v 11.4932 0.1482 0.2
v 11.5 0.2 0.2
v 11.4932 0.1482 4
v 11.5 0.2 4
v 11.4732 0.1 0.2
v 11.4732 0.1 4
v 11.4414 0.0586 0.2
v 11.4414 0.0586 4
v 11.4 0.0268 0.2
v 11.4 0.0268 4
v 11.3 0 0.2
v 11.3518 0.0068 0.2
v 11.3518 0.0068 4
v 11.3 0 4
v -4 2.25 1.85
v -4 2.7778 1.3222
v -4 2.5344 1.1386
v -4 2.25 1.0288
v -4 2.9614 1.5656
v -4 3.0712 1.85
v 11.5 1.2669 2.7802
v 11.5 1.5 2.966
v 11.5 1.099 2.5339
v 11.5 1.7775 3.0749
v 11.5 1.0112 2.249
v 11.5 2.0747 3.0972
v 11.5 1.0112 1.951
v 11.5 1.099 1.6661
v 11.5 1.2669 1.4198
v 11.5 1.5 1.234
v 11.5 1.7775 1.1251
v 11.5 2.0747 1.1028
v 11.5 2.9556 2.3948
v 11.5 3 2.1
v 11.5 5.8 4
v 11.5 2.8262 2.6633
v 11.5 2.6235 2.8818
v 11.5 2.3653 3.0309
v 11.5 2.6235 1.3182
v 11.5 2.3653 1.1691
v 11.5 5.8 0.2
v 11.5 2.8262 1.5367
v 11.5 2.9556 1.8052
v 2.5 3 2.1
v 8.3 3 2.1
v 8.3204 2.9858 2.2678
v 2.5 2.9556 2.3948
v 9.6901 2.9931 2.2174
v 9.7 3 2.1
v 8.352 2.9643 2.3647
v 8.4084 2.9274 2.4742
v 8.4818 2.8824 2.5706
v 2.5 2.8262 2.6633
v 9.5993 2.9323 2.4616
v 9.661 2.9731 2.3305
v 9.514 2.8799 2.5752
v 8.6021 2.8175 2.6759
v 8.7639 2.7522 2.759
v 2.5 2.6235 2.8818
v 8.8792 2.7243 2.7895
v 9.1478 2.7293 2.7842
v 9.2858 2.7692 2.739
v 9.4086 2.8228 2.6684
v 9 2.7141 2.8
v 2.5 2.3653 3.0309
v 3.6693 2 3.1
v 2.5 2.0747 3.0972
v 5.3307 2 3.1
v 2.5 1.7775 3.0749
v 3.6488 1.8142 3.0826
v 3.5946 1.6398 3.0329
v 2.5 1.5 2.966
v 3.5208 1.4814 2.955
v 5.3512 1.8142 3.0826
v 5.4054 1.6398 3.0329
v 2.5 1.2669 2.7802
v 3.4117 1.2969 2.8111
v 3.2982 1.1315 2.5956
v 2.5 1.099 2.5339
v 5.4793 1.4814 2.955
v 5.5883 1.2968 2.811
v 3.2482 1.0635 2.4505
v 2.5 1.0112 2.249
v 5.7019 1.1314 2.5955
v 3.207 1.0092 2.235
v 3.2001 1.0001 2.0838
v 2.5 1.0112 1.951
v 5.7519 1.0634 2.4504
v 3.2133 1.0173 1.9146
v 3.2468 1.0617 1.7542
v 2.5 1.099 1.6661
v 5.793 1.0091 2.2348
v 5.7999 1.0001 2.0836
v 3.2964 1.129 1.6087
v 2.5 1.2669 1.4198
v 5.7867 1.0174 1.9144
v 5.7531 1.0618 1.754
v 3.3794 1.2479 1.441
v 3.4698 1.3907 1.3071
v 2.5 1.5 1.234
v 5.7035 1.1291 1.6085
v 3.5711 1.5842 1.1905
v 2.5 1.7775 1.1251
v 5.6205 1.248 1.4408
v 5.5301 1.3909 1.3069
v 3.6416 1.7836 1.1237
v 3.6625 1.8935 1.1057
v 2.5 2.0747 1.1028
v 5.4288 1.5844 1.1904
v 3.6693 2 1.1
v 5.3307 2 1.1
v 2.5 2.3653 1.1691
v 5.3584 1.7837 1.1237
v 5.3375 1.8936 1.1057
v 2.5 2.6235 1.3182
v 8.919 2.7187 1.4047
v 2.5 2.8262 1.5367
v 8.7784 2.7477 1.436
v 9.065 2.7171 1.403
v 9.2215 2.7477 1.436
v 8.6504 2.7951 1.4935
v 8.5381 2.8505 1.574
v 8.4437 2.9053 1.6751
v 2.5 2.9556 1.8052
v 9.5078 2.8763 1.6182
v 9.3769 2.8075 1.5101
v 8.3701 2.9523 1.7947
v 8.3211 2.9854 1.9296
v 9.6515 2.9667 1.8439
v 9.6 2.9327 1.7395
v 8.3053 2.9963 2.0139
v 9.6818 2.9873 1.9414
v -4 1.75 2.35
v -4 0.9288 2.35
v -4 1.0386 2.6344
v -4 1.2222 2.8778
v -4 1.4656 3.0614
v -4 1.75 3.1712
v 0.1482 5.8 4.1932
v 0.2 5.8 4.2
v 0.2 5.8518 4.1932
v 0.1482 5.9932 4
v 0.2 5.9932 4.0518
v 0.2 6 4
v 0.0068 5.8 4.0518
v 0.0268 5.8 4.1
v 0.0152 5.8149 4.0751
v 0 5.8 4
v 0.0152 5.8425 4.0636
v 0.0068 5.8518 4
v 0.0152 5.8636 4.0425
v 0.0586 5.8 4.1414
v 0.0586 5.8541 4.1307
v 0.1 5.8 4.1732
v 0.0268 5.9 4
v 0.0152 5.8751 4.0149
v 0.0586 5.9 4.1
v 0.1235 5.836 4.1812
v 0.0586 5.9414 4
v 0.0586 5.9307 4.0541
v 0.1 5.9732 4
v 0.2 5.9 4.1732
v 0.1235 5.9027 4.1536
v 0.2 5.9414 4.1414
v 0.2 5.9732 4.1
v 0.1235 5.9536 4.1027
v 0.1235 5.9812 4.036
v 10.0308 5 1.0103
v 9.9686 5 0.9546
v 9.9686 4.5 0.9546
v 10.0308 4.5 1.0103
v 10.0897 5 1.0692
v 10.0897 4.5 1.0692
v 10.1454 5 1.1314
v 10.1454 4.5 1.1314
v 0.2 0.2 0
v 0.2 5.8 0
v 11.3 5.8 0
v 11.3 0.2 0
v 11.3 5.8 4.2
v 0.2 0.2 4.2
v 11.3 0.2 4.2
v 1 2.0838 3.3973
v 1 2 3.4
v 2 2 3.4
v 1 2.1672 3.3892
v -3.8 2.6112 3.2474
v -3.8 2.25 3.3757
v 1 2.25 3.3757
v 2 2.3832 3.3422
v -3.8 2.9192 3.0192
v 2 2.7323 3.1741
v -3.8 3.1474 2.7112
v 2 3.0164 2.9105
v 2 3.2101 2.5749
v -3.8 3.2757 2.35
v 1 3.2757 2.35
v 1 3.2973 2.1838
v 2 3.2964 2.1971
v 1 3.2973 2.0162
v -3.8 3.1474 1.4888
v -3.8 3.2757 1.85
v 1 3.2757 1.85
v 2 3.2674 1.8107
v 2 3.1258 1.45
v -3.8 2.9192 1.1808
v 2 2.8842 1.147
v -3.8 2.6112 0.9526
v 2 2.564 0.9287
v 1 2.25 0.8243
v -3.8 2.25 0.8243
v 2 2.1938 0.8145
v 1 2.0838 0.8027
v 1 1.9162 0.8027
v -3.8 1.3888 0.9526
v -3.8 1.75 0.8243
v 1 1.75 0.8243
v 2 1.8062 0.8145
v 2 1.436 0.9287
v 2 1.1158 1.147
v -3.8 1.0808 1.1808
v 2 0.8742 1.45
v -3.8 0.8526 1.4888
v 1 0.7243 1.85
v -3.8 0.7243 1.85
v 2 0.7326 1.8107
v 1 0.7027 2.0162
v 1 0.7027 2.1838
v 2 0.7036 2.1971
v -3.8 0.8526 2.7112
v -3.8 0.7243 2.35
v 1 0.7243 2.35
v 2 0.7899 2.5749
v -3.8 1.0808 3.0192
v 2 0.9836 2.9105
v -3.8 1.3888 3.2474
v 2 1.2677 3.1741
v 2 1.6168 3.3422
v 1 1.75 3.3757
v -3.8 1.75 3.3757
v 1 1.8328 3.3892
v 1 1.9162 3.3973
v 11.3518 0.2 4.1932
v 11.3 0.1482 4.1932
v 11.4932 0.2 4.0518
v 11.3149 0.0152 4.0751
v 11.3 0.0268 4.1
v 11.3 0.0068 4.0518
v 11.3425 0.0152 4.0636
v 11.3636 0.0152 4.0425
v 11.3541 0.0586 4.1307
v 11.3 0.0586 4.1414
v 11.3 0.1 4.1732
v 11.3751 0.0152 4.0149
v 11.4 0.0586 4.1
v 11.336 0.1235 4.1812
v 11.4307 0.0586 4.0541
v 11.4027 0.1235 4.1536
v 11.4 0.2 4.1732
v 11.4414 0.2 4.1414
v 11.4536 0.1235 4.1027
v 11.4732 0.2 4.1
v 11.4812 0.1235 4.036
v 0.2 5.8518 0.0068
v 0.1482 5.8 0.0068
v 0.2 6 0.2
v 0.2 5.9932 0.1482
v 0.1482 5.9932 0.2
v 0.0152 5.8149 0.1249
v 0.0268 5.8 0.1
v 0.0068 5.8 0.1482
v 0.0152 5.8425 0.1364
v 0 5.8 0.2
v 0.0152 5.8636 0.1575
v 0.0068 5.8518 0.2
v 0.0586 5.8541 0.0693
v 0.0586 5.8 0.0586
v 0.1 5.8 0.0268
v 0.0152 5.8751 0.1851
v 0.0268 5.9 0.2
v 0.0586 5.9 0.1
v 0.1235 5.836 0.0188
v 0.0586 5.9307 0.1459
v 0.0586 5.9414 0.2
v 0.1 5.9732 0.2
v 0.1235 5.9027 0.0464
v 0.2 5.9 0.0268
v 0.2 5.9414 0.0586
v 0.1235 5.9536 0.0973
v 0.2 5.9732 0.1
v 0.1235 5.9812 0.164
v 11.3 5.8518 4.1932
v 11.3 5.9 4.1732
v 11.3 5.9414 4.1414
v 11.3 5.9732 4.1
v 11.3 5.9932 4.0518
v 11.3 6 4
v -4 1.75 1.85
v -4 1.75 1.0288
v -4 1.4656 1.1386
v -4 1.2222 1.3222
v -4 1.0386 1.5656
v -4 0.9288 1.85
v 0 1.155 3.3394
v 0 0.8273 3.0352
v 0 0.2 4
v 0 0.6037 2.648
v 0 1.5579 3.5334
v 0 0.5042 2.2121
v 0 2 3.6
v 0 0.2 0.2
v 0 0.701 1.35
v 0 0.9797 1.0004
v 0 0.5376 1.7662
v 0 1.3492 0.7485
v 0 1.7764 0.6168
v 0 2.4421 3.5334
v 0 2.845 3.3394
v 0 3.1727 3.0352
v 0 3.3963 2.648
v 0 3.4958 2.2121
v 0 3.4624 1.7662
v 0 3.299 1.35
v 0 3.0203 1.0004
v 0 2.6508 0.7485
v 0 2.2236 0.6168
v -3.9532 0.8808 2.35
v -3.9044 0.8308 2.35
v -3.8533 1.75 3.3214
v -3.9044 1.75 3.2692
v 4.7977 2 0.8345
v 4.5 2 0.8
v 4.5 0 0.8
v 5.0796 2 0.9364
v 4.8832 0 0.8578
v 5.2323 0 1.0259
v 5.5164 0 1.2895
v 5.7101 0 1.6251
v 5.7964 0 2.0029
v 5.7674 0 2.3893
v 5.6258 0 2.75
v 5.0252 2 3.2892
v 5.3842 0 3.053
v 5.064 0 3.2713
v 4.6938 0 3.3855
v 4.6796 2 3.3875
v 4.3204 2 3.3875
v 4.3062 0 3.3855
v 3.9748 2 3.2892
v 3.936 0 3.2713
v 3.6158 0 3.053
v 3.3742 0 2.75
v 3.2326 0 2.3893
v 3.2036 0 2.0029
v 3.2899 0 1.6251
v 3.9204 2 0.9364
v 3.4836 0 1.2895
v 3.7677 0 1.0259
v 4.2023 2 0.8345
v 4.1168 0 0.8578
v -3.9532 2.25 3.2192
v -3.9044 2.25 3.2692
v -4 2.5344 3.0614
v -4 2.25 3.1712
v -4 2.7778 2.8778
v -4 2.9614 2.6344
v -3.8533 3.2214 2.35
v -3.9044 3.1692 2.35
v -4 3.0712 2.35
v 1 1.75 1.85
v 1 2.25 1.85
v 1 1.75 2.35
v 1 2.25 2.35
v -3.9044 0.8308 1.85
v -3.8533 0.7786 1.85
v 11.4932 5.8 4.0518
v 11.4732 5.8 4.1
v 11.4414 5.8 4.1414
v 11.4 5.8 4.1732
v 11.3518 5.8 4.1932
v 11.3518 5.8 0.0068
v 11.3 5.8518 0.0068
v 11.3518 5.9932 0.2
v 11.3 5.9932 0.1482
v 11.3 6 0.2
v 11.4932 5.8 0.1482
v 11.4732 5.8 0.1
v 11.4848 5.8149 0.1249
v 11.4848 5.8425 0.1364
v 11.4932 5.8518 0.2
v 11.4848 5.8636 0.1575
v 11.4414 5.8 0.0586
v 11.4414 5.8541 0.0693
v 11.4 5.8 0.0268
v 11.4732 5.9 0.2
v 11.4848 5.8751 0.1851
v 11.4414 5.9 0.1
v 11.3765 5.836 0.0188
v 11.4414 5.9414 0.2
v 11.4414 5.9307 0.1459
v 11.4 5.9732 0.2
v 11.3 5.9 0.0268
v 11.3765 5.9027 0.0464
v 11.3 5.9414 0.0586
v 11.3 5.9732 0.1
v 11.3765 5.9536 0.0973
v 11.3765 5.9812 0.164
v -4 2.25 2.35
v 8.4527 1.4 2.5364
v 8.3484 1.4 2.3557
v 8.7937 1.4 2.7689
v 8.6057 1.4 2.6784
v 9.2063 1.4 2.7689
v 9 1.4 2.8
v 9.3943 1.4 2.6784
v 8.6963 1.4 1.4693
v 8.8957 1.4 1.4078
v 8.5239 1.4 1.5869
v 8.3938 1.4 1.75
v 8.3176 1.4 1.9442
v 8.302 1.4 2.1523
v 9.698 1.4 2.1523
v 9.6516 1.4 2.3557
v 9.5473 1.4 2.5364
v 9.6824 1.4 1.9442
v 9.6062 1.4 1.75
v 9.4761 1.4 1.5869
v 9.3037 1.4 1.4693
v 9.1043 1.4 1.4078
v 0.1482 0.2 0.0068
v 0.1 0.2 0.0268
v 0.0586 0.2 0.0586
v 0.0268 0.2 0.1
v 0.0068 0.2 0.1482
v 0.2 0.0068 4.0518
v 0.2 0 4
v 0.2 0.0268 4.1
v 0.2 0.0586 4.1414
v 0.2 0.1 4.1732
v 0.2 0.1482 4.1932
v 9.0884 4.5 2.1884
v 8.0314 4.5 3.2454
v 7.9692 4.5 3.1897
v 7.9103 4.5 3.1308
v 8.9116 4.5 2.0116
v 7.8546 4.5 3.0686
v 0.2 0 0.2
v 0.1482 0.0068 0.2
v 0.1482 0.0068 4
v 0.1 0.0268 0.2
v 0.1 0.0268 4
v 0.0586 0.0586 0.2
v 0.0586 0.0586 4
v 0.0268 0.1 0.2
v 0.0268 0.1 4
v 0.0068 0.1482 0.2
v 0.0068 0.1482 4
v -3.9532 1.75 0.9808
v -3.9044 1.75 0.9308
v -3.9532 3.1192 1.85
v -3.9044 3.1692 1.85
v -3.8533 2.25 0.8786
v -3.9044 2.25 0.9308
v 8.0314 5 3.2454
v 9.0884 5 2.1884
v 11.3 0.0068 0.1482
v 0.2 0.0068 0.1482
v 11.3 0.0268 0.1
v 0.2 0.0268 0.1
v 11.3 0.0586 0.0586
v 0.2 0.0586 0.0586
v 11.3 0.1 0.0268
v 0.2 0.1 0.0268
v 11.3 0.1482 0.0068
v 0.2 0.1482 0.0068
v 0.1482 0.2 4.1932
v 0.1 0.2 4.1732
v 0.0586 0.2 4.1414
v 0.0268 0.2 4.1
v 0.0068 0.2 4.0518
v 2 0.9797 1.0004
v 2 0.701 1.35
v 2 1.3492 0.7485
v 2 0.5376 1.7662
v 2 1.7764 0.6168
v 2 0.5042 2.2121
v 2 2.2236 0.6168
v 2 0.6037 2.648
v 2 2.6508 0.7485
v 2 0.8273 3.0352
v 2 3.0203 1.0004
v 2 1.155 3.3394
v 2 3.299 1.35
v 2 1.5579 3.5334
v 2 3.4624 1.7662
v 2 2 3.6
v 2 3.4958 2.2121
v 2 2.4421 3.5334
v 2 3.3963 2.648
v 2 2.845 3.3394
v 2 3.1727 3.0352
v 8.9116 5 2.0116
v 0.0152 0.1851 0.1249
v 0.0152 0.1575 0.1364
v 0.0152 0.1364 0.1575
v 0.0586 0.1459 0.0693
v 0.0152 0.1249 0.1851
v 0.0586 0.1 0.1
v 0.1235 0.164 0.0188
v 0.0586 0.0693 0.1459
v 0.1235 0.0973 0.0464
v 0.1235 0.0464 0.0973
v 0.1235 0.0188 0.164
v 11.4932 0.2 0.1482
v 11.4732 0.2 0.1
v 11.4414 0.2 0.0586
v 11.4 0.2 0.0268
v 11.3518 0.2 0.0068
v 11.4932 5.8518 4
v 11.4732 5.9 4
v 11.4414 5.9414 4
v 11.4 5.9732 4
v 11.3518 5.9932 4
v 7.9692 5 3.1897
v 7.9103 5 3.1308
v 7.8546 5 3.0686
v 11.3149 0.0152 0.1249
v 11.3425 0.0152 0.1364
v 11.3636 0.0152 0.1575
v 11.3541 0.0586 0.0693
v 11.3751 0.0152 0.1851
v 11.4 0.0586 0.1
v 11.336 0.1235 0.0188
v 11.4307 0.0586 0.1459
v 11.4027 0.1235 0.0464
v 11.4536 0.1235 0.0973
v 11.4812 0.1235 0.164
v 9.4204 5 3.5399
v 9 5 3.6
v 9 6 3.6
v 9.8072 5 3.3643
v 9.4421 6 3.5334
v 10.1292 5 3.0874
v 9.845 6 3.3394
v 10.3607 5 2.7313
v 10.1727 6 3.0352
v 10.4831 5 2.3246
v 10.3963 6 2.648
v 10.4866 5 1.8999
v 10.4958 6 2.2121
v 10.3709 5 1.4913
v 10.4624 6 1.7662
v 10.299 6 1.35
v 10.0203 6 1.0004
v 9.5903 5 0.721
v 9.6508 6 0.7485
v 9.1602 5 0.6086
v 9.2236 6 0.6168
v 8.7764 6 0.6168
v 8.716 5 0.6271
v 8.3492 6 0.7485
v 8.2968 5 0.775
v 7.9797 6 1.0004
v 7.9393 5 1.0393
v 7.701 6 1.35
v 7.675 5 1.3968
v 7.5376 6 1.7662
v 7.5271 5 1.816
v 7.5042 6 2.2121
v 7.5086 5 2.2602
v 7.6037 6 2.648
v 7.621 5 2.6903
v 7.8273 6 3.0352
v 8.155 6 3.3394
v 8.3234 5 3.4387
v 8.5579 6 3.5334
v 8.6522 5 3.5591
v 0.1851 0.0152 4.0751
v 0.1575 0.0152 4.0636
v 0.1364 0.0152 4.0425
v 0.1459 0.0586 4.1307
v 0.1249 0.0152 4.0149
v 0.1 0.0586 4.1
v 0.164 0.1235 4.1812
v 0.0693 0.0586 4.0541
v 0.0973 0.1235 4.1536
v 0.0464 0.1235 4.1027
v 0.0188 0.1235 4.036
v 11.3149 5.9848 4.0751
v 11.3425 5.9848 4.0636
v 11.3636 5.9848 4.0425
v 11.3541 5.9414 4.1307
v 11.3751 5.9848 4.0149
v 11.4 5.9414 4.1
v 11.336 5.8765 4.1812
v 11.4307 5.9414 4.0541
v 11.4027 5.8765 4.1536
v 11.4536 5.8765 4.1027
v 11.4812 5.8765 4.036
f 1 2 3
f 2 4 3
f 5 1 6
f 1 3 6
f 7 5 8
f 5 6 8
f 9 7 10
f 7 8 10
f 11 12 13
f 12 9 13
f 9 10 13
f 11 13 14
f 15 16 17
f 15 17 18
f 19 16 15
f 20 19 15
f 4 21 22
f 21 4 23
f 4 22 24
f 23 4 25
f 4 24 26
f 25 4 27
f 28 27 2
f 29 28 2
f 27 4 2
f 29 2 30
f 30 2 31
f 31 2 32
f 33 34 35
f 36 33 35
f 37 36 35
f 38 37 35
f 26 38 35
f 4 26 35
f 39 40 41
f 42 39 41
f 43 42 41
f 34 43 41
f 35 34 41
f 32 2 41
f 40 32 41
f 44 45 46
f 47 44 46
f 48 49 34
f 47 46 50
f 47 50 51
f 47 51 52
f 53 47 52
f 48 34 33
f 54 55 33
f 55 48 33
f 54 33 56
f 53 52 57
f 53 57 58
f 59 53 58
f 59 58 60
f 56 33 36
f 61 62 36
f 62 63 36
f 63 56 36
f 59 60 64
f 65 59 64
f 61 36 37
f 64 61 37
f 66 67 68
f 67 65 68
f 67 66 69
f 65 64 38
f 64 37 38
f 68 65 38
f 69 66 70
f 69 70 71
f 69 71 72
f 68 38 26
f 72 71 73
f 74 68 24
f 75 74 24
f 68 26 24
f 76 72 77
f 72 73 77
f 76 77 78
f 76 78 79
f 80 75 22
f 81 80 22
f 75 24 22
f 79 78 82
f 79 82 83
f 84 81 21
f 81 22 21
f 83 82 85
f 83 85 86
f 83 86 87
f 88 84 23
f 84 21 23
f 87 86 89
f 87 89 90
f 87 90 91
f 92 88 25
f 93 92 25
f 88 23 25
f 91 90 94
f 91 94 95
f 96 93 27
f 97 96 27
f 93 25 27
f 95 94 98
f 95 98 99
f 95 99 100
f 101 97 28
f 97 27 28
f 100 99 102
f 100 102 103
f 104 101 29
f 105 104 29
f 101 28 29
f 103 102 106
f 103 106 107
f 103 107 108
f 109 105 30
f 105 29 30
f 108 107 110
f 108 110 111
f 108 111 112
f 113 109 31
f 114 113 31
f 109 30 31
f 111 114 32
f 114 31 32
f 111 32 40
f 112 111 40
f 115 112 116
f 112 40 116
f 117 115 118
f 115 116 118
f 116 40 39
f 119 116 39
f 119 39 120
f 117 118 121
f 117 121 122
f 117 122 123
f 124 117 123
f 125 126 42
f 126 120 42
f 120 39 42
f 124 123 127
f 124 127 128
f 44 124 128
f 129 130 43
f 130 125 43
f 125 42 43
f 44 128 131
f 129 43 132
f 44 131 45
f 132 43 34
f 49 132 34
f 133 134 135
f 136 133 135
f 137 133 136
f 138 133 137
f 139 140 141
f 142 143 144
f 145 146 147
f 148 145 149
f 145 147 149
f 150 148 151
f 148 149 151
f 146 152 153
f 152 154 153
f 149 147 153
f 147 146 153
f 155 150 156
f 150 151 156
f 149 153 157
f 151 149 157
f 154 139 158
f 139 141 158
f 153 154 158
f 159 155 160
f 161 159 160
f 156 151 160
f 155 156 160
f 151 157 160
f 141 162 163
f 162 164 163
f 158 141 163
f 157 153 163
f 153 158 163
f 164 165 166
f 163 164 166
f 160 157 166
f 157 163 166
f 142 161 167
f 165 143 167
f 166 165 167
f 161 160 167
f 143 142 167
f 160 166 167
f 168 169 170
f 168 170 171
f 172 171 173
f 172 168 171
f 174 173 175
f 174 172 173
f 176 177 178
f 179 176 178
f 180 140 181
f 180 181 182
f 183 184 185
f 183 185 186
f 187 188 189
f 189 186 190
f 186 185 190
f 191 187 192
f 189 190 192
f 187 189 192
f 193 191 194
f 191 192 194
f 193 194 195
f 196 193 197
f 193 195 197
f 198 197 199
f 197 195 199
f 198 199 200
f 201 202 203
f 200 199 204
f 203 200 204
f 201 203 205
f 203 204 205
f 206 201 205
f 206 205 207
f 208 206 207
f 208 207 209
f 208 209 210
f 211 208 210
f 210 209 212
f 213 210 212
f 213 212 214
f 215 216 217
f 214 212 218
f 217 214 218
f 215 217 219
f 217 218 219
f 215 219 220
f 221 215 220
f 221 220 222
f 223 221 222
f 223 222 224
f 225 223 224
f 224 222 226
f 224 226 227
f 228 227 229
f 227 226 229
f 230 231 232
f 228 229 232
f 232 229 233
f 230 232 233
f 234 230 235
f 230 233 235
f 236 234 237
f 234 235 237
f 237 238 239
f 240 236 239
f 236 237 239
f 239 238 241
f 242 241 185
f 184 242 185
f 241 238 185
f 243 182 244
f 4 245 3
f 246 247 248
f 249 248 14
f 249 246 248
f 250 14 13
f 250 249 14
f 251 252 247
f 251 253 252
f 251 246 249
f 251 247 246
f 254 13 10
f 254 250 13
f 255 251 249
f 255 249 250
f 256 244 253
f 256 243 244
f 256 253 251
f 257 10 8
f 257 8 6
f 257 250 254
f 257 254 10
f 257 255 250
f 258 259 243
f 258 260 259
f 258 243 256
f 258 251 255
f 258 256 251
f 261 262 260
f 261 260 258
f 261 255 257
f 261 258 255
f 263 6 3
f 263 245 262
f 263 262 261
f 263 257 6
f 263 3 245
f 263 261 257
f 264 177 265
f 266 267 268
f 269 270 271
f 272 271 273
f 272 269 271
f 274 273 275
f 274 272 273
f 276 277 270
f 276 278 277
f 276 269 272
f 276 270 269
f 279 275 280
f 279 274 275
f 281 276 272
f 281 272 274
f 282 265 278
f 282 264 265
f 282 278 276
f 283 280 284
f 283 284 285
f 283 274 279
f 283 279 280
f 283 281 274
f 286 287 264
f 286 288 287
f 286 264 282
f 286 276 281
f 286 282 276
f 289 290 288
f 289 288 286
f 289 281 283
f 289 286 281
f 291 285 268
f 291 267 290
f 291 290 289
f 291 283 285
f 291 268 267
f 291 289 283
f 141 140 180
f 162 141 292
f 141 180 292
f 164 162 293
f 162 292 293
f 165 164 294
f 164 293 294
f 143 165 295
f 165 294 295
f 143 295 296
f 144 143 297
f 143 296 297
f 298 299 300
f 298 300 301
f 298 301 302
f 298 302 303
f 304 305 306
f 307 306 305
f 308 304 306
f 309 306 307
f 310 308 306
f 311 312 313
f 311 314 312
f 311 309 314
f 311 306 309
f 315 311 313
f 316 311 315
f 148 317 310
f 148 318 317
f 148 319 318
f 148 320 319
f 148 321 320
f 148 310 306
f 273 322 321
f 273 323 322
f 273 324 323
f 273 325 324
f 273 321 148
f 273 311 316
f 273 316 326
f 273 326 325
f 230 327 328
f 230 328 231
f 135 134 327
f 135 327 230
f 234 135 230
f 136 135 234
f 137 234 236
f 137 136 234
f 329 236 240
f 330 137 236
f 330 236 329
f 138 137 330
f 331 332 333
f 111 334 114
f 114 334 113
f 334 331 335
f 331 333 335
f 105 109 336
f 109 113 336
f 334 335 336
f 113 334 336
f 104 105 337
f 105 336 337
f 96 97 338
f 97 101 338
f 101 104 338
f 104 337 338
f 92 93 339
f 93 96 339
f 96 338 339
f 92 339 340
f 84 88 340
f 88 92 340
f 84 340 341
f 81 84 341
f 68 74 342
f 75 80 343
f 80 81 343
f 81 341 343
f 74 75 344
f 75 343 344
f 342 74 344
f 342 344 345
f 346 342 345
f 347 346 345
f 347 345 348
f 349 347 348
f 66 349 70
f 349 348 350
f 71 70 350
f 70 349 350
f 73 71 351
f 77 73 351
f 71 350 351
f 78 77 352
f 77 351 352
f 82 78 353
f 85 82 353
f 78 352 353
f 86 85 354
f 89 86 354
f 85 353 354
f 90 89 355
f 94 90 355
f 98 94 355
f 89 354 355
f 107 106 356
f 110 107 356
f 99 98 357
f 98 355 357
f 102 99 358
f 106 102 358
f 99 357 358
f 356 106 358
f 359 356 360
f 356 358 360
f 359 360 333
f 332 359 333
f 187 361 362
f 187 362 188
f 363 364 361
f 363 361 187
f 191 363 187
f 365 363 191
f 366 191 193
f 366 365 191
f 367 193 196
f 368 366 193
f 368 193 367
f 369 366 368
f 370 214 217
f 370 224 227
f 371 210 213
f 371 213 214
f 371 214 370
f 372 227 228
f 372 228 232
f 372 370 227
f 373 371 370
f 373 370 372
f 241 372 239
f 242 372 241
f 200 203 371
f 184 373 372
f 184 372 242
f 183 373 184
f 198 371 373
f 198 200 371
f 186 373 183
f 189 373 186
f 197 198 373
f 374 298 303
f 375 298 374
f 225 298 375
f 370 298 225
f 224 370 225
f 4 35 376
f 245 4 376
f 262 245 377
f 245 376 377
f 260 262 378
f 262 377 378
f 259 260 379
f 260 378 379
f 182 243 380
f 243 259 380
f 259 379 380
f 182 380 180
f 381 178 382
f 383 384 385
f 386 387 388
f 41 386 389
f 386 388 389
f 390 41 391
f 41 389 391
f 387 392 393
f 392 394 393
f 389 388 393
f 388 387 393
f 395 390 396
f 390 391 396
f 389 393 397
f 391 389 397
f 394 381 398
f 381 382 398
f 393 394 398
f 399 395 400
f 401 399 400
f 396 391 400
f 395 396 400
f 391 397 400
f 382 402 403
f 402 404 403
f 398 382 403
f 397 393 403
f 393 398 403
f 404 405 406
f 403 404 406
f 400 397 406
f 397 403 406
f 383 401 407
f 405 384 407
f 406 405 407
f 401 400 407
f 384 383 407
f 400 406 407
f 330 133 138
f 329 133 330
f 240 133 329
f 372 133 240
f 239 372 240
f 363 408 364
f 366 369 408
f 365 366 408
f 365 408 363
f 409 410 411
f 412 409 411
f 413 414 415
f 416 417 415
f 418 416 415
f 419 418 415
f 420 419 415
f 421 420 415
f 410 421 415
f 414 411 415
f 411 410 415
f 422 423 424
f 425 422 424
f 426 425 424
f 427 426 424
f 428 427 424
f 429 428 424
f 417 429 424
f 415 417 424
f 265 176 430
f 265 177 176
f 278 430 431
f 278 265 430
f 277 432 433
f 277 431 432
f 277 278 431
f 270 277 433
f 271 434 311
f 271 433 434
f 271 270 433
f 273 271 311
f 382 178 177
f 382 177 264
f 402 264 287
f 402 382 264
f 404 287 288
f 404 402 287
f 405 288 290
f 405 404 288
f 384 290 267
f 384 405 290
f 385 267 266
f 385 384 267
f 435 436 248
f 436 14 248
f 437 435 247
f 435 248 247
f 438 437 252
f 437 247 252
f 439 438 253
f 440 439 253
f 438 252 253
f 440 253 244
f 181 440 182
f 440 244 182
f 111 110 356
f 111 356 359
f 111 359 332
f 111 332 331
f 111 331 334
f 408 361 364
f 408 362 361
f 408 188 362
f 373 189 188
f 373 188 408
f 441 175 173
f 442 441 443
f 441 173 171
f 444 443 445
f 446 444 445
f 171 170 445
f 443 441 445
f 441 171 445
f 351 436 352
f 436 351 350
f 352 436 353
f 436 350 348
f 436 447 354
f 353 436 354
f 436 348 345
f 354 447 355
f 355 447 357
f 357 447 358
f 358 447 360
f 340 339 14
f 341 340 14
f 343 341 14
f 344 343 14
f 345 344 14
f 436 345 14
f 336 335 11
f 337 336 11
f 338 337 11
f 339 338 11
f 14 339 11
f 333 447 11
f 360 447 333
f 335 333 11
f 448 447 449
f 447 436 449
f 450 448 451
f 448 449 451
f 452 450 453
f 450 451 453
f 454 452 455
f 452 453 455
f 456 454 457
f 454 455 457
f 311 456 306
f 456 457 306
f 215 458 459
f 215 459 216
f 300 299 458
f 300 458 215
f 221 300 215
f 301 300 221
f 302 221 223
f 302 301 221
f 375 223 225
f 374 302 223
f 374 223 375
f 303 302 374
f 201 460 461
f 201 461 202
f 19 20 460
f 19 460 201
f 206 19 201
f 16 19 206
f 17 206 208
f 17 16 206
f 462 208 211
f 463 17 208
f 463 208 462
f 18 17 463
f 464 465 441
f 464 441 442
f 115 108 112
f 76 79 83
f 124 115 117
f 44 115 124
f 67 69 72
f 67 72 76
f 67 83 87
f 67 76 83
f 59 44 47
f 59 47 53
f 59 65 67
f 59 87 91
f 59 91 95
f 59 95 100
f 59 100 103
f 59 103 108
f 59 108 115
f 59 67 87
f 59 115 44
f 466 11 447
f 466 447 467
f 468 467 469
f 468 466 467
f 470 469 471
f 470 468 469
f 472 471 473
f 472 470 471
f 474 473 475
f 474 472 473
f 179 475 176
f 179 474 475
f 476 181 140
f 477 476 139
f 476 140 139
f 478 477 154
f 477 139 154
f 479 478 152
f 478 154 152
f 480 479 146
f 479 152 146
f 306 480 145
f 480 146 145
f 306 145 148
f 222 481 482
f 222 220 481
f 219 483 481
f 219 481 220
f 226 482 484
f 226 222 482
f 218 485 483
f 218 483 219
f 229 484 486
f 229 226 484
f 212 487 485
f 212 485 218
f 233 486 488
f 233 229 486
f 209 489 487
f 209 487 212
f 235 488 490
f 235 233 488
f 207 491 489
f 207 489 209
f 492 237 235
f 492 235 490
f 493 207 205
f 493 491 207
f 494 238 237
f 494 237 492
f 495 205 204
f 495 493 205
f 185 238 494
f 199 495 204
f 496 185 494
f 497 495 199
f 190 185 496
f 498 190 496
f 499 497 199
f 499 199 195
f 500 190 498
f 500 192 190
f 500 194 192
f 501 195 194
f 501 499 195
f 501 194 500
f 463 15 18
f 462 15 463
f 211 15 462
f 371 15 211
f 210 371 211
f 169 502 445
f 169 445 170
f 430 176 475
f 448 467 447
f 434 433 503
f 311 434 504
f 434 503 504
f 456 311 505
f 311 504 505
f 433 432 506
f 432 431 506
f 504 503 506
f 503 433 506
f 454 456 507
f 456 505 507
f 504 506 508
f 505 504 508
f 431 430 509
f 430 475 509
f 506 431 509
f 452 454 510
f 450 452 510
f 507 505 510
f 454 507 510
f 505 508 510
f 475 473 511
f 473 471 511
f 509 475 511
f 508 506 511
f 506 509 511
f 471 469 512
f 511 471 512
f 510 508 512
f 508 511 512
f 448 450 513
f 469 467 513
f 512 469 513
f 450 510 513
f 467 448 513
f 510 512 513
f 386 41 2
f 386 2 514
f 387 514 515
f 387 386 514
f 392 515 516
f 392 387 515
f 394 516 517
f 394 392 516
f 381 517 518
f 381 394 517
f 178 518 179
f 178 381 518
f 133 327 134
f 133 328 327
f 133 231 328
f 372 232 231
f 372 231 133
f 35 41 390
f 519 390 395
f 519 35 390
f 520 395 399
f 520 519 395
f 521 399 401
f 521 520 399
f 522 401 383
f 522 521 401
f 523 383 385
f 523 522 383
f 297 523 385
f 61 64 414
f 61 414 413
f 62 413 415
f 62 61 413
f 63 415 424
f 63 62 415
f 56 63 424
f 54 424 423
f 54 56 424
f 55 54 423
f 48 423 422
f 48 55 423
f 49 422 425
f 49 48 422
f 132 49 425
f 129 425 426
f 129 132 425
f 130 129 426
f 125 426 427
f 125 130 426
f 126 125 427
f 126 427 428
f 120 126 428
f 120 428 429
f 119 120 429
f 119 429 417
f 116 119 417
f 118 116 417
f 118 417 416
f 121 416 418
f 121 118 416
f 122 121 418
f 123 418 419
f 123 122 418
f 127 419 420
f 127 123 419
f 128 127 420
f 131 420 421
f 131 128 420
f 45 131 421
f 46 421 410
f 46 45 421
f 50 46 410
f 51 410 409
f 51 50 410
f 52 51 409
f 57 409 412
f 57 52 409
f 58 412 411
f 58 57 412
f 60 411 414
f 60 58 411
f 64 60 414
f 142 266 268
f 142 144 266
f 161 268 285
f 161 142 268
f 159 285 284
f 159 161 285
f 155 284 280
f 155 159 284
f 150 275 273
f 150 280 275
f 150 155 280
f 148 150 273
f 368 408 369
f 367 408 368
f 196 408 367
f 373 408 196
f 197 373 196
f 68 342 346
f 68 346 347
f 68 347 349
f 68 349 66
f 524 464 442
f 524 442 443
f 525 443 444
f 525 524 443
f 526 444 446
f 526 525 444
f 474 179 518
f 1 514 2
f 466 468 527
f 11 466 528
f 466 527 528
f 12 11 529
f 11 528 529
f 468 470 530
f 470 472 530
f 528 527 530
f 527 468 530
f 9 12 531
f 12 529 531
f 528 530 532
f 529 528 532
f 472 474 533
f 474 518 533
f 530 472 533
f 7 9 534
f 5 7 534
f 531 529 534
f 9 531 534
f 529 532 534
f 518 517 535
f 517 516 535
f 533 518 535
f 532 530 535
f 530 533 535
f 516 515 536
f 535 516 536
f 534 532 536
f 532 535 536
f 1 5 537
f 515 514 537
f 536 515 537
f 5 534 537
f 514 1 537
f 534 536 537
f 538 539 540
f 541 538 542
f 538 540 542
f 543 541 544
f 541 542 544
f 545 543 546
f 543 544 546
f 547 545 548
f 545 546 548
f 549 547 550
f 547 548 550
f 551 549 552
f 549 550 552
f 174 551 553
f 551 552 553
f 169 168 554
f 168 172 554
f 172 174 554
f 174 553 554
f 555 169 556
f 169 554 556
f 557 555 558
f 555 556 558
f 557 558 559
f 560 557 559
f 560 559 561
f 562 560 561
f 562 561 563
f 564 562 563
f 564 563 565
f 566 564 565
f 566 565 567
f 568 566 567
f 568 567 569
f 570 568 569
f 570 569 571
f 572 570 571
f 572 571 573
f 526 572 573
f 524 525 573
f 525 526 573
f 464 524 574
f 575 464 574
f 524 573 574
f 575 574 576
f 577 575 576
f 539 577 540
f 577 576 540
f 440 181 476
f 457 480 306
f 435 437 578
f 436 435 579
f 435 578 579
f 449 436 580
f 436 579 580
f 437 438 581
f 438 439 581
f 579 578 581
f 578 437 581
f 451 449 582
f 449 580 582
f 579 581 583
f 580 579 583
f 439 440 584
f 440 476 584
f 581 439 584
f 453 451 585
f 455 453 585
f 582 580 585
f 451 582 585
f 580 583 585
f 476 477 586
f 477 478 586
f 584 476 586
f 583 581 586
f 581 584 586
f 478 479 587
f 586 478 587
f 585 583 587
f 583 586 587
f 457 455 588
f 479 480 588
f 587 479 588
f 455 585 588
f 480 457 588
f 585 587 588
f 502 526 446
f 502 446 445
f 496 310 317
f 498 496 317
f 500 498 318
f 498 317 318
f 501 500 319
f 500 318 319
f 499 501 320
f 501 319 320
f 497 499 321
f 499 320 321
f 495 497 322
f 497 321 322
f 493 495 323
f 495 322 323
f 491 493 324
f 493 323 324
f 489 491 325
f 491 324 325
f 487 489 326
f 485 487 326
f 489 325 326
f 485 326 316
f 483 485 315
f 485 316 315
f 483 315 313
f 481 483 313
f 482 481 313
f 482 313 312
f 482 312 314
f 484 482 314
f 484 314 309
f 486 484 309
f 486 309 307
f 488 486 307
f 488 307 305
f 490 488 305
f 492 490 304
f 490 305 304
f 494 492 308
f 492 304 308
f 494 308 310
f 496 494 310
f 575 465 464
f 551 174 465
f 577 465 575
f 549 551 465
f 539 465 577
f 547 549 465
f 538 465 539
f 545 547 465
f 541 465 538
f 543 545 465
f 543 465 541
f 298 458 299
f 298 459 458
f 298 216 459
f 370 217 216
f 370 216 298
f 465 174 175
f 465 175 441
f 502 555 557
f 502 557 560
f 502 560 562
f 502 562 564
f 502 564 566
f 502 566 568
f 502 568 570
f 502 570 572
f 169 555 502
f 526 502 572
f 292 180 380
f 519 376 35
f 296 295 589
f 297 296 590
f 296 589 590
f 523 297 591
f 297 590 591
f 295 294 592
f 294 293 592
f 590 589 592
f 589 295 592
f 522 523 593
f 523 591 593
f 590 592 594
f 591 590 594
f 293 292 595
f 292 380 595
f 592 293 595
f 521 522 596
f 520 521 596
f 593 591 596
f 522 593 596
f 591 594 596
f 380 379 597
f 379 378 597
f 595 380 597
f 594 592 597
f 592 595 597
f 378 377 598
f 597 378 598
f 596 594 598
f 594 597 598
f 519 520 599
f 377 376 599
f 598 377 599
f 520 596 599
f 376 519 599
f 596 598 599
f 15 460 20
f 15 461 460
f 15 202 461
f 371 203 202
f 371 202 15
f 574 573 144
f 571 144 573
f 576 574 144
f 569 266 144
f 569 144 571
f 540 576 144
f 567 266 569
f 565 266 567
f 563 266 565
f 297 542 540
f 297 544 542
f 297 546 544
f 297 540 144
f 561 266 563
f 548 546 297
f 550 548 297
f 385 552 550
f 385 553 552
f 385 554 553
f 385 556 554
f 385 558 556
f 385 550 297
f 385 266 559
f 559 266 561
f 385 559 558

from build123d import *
from build123d.topology import SkipClean

# Parameters (mm, degrees)
SKETCH_1_W          = 11.5
SKETCH_1_H          = 6
EXTRUDE_1_DEPTH     = 4.2
SKETCH_2_R          = 1.5
CUT_EXTRUDE_1_DEPTH = 2
SKETCH_3_R          = 1.3
EXTRUDE_2_DEPTH     = 6
CHAMFER_1_SIZE      = 0.2
CUT_EXTRUDE_START   = -5
CUT_EXTRUDE_2_DEPTH = 5
SKETCH_5_R          = 1
CUT_EXTRUDE_3_DEPTH = 9
SKETCH_6_R          = 1.3
CUT_EXTRUDE_4_DEPTH = 2
SKETCH_7_R          = 1.5
CUT_EXTRUDE_5_DEPTH = 1
CUT_EXTRUDE_6_DEPTH = 0.5
EXTRUDE_START       = -3
SKETCH_9_R          = 0.7
EXTRUDE_3_DEPTH     = 1.6
FILLET_1_R          = 0.2


with BuildPart() as part:
    # 草图1 → 凸台-拉伸1 (new body)
    with BuildSketch(Plane.XY):
        with Locations((5.75, 3)):
            Rectangle(SKETCH_1_W, SKETCH_1_H)
    extrude(amount=EXTRUDE_1_DEPTH)

    # 草图2 → 切除-拉伸1 (cut)
    with BuildSketch(Plane.ZY):
        with Locations((2.1, 2)):
            Circle(SKETCH_2_R)
    extrude(amount=-CUT_EXTRUDE_1_DEPTH, mode=Mode.SUBTRACT)

    # 草图3 → 凸台-拉伸2 (add)
    with BuildSketch(Plane.ZY.offset(-2)):
        with Locations((2.1, 2)):
            Circle(SKETCH_3_R)
    extrude(amount=EXTRUDE_2_DEPTH)

    # 倒角1
    chamfer_1_edges = [part.edges().sort_by_distance(p)[0] for p in [
        (-4, 2, 0.8),
    ]]
    chamfer(chamfer_1_edges, length=CHAMFER_1_SIZE)

    # 草图4 → 切除-拉伸2 (cut)
    with BuildSketch(Plane.ZY.offset(4).offset(CUT_EXTRUDE_START)):
        with BuildLine():
            Line((1.85, 3.275735082), (1.85, 2.25))
            Line((1.85, 2.25), (0.824264918, 2.25))
            ThreePointArc((0.824264918, 2.25), (0.8, 2), (0.824264918, 1.75))
            Line((0.824264918, 1.75), (1.85, 1.75))
            Line((1.85, 1.75), (1.85, 0.724264918))
            ThreePointArc((1.85, 0.724264918), (2.1, 0.7), (2.35, 0.724264918))
            Line((2.35, 0.724264918), (2.35, 1.75))
            Line((2.35, 1.75), (3.375735082, 1.75))
            ThreePointArc((3.375735082, 1.75), (3.4, 2), (3.375735082, 2.25))
            Line((3.375735082, 2.25), (2.35, 2.25))
            Line((2.35, 2.25), (2.35, 3.275735082))
            ThreePointArc((2.35, 3.275735082), (2.1, 3.3), (1.85, 3.275735082))
        make_face()
    extrude(amount=CUT_EXTRUDE_2_DEPTH, mode=Mode.SUBTRACT)

    # 草图5 → 切除-拉伸3 (cut)
    with BuildSketch(Plane(origin=(11.5, 0, 0), x_dir=(0, 0, -1), z_dir=(1, 0, 0))):
        with Locations((-2.1, 2)):
            Circle(SKETCH_5_R)
    extrude(amount=-CUT_EXTRUDE_3_DEPTH, mode=Mode.SUBTRACT)

    # 草图6 → 切除-拉伸4 (cut)
    with BuildSketch(Plane.XZ):
        with Locations((4.5, 2.1)):
            Circle(SKETCH_6_R)
    extrude(amount=-CUT_EXTRUDE_4_DEPTH, mode=Mode.SUBTRACT)

    # 草图7 → 切除-拉伸5 (cut)
    with BuildSketch(Plane(origin=(0, 6, 0), x_dir=(1, 0, 0), z_dir=(0, 1, 0))):
        with Locations((9, -2.1)):
            Circle(SKETCH_7_R)
    extrude(amount=-CUT_EXTRUDE_5_DEPTH, mode=Mode.SUBTRACT)

    # 草图8 → 切除-拉伸6 (cut)
    with SkipClean():  # the faces are left unmerged after this step: merging them gives an invalid solid
        with BuildSketch(Plane(origin=(0, 5, 0), x_dir=(1, 0, 0), z_dir=(0, 1, 0))):
            with BuildLine():
                Line((9.088388348, -2.188388348), (8.03141744, -3.245359255))
                ThreePointArc((8.03141744, -3.245359255), (7.939339828, -3.160660172), (7.854640745, -3.06858256))
                Line((7.854640745, -3.06858256), (8.911611652, -2.011611652))
                Line((8.911611652, -2.011611652), (9.96858256, -0.954640745))
                ThreePointArc((9.96858256, -0.954640745), (10.060660172, -1.039339828), (10.145359255, -1.13141744))
                Line((10.145359255, -1.13141744), (9.088388348, -2.188388348))
            make_face()
        extrude(amount=-CUT_EXTRUDE_6_DEPTH, mode=Mode.SUBTRACT)

    # 草图9 → 凸台-拉伸3 (add)
    with SkipClean():  # the faces are left unmerged after this step: merging them gives an invalid solid
        with BuildSketch(Plane(origin=(0, 6, 0), x_dir=(1, 0, 0), z_dir=(0, 1, 0)).offset(EXTRUDE_START)):
            with Locations((9, -2.1)):
                Circle(SKETCH_9_R)
        extrude(amount=-EXTRUDE_3_DEPTH)

    # 圆角1
    fillet_1_edges = [part.edges().sort_by_distance(p)[0] for p in [
        (0, 0, 2.1),
        (0, 3, 0),
        (5.75, 6, 0),
        (5.75, 0, 0),
        (11.5, 3, 0),
        (11.5, 0, 2.1),
        (11.5, 6, 2.1),
        (11.5, 3, 4.2),
        (5.75, 0, 4.2),
        (5.75, 6, 4.2),
        (0, 6, 2.1),
        (0, 3, 4.2),
    ]]
    fillet(fillet_1_edges, radius=FILLET_1_R)


solid = part.part
